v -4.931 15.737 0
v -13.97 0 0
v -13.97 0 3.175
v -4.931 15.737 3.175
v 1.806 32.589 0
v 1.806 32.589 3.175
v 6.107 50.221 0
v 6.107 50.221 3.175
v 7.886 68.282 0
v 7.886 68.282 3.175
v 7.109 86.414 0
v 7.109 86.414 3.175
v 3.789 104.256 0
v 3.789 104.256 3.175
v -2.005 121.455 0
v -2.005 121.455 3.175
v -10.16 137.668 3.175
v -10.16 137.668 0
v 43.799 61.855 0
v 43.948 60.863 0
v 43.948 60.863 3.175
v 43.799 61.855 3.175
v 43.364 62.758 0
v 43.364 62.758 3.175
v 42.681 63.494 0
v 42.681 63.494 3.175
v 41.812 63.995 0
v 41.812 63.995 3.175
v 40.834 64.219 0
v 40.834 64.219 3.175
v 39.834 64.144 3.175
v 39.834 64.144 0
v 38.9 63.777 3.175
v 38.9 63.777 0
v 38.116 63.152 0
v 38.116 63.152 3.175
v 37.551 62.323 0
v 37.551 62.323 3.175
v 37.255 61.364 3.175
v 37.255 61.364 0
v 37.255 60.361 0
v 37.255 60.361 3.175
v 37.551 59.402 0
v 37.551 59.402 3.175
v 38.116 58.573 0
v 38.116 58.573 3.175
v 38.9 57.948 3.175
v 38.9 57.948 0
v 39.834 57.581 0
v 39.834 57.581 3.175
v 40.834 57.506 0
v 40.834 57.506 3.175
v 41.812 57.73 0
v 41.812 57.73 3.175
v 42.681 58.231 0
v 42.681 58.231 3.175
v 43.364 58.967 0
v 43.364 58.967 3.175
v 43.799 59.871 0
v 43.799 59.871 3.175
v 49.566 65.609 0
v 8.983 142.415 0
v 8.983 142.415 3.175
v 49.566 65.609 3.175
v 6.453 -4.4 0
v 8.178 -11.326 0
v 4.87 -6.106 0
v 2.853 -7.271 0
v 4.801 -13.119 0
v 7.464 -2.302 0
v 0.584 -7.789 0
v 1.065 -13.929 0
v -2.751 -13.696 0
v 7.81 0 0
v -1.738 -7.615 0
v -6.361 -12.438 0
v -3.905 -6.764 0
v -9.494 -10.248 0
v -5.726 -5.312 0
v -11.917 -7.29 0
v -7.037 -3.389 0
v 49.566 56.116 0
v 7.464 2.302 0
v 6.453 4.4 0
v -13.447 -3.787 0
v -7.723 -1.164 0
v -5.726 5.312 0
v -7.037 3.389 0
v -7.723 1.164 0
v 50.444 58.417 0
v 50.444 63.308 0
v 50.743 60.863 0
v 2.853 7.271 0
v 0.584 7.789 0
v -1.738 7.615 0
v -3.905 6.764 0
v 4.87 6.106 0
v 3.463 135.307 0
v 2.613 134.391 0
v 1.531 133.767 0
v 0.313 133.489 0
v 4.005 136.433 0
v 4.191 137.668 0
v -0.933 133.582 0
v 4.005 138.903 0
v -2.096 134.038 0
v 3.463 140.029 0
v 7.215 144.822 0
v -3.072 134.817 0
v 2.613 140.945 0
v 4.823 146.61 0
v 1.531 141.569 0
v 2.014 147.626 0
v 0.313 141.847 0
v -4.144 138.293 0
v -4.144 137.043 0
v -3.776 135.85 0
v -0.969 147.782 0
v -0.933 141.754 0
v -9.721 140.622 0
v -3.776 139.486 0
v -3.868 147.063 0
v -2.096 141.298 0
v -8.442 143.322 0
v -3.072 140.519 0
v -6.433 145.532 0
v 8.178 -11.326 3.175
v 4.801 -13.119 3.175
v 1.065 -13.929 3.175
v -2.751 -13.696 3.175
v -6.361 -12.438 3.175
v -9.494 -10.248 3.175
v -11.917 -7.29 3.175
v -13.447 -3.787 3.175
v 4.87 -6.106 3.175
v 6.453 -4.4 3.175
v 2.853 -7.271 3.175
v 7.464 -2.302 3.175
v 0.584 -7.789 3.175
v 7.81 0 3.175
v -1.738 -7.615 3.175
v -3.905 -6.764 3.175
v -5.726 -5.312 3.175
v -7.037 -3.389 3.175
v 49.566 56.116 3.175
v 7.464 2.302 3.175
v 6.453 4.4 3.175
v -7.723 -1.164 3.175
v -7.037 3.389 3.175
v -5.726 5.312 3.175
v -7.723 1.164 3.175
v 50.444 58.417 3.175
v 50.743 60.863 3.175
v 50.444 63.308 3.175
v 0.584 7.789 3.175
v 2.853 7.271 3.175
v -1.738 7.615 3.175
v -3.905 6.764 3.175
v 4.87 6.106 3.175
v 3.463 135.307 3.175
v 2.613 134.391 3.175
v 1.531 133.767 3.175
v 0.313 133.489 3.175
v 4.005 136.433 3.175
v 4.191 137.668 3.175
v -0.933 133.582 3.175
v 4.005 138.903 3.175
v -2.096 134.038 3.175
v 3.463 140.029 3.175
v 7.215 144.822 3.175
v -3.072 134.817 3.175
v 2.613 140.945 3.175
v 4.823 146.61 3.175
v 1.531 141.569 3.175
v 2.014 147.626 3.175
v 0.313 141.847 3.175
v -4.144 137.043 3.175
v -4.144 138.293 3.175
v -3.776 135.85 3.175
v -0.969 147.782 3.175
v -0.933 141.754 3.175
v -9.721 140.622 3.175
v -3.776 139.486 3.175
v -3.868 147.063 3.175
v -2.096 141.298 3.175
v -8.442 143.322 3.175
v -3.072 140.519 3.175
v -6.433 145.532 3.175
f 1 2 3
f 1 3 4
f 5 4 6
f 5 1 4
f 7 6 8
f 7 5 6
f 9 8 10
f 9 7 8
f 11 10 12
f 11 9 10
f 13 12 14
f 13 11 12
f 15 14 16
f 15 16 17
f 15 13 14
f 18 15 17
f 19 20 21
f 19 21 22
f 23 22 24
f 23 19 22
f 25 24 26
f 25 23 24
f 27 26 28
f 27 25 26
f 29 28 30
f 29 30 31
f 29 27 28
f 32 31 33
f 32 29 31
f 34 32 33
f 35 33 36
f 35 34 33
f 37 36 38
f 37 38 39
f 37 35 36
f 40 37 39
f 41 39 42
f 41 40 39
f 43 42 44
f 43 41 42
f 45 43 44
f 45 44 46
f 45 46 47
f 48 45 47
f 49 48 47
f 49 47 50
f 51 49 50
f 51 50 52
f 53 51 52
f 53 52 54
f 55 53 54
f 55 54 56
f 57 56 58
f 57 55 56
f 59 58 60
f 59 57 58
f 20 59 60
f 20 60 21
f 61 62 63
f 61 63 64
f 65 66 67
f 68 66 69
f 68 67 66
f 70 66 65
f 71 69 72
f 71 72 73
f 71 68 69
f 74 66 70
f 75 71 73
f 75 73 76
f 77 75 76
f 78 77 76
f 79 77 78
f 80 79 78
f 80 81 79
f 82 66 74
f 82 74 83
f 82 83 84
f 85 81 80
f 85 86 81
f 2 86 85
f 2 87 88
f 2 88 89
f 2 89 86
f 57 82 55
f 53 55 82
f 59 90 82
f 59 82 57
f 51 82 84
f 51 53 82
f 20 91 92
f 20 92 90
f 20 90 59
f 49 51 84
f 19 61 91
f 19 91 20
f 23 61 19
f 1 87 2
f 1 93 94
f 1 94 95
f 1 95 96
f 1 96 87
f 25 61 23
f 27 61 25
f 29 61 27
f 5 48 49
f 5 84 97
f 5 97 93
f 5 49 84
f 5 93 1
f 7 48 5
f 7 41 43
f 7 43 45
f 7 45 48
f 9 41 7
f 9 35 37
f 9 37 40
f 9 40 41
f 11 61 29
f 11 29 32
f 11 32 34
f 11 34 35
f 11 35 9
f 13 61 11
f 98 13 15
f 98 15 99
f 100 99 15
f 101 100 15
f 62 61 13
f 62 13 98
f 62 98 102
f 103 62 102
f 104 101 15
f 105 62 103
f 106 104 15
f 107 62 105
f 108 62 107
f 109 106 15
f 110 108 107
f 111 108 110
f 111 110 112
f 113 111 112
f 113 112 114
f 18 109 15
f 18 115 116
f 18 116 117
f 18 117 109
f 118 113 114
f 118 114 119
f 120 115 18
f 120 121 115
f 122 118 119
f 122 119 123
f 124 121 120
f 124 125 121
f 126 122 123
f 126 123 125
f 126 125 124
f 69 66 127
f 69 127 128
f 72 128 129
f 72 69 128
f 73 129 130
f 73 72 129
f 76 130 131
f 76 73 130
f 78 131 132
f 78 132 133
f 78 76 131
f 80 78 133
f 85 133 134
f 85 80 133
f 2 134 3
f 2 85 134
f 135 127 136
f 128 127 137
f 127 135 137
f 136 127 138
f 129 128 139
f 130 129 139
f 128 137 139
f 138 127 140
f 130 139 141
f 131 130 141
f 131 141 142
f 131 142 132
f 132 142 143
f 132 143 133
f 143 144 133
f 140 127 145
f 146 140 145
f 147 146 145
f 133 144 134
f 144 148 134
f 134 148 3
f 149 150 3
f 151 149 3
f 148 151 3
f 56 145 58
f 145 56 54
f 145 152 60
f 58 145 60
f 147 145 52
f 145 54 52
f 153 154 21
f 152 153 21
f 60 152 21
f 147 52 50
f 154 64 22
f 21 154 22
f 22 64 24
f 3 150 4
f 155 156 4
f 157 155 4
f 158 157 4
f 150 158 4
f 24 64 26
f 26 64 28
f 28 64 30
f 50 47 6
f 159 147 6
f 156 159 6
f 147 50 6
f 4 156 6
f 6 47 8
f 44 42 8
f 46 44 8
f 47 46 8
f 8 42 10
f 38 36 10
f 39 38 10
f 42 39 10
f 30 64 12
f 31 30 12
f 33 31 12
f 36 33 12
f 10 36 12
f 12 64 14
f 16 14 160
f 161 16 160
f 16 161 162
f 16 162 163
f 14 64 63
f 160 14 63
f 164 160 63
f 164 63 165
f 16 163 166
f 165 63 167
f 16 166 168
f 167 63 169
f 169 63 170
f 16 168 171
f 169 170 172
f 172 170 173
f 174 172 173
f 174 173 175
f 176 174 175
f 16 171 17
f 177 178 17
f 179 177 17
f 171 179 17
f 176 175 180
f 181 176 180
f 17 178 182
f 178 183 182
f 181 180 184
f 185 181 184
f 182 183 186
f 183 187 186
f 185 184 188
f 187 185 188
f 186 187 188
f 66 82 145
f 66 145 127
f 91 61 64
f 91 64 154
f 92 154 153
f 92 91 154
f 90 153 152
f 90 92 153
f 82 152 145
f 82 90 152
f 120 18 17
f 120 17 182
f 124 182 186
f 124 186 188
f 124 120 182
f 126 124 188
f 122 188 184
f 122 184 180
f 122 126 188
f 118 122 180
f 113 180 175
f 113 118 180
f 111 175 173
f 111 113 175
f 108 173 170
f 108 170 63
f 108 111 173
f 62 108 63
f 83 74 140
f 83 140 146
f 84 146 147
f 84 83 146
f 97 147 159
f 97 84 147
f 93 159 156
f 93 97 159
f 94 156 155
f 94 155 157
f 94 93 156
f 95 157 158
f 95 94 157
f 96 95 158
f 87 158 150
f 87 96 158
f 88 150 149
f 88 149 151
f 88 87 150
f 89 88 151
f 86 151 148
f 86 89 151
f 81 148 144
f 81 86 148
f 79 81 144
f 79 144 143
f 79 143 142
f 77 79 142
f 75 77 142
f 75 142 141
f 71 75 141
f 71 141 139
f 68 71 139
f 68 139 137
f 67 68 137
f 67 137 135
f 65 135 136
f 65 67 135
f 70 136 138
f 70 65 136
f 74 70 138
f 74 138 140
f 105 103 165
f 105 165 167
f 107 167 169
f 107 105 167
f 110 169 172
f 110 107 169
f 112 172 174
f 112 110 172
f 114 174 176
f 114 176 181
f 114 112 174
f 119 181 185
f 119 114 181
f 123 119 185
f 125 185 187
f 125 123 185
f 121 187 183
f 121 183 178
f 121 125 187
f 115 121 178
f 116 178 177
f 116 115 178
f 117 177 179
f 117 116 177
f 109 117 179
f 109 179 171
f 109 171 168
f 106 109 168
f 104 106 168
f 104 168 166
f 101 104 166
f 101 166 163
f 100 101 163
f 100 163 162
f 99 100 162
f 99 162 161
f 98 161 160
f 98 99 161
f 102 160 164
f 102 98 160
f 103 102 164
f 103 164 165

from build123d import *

# Parameters (mm, degrees)
SKETCH1_R           = 7.8105
SKETCH1_R_2         = 3.3655
SKETCH1_R_3         = 4.191
BOSS_EXTRUDE1_DEPTH = 3.175


with BuildPart() as part:
    # Sketch1 → Boss-Extrude1 (new body)
    with BuildSketch(Plane.XY):
        with BuildLine():
            Line((8.98309661, 142.414532976), (49.565953559, 65.609056962))
            ThreePointArc((49.565953559, 65.609056962), (50.742856949, 60.862523985), (49.565953559, 56.115991009))
            Line((49.565953559, 56.115991009), (8.177790267, -11.326281223))
            ThreePointArc((8.177790267, -11.326281223), (-6.360706327, -12.437938536), (-13.97, 0))
            ThreePointArc((-13.97, 0), (7.886144716, 68.281846548), (-10.16, 137.668))
            ThreePointArc((-10.16, 137.668), (-2.445131739, 147.529385845), (8.98309661, 142.414532976))
        make_face()
        Circle(SKETCH1_R, mode=Mode.SUBTRACT)
        with Locations((40.582856949, 60.862523985)):
            Circle(SKETCH1_R_2, mode=Mode.SUBTRACT)
        with Locations((0, 137.668)):
            Circle(SKETCH1_R_3, mode=Mode.SUBTRACT)
    extrude(amount=BOSS_EXTRUDE1_DEPTH)


solid = part.part
